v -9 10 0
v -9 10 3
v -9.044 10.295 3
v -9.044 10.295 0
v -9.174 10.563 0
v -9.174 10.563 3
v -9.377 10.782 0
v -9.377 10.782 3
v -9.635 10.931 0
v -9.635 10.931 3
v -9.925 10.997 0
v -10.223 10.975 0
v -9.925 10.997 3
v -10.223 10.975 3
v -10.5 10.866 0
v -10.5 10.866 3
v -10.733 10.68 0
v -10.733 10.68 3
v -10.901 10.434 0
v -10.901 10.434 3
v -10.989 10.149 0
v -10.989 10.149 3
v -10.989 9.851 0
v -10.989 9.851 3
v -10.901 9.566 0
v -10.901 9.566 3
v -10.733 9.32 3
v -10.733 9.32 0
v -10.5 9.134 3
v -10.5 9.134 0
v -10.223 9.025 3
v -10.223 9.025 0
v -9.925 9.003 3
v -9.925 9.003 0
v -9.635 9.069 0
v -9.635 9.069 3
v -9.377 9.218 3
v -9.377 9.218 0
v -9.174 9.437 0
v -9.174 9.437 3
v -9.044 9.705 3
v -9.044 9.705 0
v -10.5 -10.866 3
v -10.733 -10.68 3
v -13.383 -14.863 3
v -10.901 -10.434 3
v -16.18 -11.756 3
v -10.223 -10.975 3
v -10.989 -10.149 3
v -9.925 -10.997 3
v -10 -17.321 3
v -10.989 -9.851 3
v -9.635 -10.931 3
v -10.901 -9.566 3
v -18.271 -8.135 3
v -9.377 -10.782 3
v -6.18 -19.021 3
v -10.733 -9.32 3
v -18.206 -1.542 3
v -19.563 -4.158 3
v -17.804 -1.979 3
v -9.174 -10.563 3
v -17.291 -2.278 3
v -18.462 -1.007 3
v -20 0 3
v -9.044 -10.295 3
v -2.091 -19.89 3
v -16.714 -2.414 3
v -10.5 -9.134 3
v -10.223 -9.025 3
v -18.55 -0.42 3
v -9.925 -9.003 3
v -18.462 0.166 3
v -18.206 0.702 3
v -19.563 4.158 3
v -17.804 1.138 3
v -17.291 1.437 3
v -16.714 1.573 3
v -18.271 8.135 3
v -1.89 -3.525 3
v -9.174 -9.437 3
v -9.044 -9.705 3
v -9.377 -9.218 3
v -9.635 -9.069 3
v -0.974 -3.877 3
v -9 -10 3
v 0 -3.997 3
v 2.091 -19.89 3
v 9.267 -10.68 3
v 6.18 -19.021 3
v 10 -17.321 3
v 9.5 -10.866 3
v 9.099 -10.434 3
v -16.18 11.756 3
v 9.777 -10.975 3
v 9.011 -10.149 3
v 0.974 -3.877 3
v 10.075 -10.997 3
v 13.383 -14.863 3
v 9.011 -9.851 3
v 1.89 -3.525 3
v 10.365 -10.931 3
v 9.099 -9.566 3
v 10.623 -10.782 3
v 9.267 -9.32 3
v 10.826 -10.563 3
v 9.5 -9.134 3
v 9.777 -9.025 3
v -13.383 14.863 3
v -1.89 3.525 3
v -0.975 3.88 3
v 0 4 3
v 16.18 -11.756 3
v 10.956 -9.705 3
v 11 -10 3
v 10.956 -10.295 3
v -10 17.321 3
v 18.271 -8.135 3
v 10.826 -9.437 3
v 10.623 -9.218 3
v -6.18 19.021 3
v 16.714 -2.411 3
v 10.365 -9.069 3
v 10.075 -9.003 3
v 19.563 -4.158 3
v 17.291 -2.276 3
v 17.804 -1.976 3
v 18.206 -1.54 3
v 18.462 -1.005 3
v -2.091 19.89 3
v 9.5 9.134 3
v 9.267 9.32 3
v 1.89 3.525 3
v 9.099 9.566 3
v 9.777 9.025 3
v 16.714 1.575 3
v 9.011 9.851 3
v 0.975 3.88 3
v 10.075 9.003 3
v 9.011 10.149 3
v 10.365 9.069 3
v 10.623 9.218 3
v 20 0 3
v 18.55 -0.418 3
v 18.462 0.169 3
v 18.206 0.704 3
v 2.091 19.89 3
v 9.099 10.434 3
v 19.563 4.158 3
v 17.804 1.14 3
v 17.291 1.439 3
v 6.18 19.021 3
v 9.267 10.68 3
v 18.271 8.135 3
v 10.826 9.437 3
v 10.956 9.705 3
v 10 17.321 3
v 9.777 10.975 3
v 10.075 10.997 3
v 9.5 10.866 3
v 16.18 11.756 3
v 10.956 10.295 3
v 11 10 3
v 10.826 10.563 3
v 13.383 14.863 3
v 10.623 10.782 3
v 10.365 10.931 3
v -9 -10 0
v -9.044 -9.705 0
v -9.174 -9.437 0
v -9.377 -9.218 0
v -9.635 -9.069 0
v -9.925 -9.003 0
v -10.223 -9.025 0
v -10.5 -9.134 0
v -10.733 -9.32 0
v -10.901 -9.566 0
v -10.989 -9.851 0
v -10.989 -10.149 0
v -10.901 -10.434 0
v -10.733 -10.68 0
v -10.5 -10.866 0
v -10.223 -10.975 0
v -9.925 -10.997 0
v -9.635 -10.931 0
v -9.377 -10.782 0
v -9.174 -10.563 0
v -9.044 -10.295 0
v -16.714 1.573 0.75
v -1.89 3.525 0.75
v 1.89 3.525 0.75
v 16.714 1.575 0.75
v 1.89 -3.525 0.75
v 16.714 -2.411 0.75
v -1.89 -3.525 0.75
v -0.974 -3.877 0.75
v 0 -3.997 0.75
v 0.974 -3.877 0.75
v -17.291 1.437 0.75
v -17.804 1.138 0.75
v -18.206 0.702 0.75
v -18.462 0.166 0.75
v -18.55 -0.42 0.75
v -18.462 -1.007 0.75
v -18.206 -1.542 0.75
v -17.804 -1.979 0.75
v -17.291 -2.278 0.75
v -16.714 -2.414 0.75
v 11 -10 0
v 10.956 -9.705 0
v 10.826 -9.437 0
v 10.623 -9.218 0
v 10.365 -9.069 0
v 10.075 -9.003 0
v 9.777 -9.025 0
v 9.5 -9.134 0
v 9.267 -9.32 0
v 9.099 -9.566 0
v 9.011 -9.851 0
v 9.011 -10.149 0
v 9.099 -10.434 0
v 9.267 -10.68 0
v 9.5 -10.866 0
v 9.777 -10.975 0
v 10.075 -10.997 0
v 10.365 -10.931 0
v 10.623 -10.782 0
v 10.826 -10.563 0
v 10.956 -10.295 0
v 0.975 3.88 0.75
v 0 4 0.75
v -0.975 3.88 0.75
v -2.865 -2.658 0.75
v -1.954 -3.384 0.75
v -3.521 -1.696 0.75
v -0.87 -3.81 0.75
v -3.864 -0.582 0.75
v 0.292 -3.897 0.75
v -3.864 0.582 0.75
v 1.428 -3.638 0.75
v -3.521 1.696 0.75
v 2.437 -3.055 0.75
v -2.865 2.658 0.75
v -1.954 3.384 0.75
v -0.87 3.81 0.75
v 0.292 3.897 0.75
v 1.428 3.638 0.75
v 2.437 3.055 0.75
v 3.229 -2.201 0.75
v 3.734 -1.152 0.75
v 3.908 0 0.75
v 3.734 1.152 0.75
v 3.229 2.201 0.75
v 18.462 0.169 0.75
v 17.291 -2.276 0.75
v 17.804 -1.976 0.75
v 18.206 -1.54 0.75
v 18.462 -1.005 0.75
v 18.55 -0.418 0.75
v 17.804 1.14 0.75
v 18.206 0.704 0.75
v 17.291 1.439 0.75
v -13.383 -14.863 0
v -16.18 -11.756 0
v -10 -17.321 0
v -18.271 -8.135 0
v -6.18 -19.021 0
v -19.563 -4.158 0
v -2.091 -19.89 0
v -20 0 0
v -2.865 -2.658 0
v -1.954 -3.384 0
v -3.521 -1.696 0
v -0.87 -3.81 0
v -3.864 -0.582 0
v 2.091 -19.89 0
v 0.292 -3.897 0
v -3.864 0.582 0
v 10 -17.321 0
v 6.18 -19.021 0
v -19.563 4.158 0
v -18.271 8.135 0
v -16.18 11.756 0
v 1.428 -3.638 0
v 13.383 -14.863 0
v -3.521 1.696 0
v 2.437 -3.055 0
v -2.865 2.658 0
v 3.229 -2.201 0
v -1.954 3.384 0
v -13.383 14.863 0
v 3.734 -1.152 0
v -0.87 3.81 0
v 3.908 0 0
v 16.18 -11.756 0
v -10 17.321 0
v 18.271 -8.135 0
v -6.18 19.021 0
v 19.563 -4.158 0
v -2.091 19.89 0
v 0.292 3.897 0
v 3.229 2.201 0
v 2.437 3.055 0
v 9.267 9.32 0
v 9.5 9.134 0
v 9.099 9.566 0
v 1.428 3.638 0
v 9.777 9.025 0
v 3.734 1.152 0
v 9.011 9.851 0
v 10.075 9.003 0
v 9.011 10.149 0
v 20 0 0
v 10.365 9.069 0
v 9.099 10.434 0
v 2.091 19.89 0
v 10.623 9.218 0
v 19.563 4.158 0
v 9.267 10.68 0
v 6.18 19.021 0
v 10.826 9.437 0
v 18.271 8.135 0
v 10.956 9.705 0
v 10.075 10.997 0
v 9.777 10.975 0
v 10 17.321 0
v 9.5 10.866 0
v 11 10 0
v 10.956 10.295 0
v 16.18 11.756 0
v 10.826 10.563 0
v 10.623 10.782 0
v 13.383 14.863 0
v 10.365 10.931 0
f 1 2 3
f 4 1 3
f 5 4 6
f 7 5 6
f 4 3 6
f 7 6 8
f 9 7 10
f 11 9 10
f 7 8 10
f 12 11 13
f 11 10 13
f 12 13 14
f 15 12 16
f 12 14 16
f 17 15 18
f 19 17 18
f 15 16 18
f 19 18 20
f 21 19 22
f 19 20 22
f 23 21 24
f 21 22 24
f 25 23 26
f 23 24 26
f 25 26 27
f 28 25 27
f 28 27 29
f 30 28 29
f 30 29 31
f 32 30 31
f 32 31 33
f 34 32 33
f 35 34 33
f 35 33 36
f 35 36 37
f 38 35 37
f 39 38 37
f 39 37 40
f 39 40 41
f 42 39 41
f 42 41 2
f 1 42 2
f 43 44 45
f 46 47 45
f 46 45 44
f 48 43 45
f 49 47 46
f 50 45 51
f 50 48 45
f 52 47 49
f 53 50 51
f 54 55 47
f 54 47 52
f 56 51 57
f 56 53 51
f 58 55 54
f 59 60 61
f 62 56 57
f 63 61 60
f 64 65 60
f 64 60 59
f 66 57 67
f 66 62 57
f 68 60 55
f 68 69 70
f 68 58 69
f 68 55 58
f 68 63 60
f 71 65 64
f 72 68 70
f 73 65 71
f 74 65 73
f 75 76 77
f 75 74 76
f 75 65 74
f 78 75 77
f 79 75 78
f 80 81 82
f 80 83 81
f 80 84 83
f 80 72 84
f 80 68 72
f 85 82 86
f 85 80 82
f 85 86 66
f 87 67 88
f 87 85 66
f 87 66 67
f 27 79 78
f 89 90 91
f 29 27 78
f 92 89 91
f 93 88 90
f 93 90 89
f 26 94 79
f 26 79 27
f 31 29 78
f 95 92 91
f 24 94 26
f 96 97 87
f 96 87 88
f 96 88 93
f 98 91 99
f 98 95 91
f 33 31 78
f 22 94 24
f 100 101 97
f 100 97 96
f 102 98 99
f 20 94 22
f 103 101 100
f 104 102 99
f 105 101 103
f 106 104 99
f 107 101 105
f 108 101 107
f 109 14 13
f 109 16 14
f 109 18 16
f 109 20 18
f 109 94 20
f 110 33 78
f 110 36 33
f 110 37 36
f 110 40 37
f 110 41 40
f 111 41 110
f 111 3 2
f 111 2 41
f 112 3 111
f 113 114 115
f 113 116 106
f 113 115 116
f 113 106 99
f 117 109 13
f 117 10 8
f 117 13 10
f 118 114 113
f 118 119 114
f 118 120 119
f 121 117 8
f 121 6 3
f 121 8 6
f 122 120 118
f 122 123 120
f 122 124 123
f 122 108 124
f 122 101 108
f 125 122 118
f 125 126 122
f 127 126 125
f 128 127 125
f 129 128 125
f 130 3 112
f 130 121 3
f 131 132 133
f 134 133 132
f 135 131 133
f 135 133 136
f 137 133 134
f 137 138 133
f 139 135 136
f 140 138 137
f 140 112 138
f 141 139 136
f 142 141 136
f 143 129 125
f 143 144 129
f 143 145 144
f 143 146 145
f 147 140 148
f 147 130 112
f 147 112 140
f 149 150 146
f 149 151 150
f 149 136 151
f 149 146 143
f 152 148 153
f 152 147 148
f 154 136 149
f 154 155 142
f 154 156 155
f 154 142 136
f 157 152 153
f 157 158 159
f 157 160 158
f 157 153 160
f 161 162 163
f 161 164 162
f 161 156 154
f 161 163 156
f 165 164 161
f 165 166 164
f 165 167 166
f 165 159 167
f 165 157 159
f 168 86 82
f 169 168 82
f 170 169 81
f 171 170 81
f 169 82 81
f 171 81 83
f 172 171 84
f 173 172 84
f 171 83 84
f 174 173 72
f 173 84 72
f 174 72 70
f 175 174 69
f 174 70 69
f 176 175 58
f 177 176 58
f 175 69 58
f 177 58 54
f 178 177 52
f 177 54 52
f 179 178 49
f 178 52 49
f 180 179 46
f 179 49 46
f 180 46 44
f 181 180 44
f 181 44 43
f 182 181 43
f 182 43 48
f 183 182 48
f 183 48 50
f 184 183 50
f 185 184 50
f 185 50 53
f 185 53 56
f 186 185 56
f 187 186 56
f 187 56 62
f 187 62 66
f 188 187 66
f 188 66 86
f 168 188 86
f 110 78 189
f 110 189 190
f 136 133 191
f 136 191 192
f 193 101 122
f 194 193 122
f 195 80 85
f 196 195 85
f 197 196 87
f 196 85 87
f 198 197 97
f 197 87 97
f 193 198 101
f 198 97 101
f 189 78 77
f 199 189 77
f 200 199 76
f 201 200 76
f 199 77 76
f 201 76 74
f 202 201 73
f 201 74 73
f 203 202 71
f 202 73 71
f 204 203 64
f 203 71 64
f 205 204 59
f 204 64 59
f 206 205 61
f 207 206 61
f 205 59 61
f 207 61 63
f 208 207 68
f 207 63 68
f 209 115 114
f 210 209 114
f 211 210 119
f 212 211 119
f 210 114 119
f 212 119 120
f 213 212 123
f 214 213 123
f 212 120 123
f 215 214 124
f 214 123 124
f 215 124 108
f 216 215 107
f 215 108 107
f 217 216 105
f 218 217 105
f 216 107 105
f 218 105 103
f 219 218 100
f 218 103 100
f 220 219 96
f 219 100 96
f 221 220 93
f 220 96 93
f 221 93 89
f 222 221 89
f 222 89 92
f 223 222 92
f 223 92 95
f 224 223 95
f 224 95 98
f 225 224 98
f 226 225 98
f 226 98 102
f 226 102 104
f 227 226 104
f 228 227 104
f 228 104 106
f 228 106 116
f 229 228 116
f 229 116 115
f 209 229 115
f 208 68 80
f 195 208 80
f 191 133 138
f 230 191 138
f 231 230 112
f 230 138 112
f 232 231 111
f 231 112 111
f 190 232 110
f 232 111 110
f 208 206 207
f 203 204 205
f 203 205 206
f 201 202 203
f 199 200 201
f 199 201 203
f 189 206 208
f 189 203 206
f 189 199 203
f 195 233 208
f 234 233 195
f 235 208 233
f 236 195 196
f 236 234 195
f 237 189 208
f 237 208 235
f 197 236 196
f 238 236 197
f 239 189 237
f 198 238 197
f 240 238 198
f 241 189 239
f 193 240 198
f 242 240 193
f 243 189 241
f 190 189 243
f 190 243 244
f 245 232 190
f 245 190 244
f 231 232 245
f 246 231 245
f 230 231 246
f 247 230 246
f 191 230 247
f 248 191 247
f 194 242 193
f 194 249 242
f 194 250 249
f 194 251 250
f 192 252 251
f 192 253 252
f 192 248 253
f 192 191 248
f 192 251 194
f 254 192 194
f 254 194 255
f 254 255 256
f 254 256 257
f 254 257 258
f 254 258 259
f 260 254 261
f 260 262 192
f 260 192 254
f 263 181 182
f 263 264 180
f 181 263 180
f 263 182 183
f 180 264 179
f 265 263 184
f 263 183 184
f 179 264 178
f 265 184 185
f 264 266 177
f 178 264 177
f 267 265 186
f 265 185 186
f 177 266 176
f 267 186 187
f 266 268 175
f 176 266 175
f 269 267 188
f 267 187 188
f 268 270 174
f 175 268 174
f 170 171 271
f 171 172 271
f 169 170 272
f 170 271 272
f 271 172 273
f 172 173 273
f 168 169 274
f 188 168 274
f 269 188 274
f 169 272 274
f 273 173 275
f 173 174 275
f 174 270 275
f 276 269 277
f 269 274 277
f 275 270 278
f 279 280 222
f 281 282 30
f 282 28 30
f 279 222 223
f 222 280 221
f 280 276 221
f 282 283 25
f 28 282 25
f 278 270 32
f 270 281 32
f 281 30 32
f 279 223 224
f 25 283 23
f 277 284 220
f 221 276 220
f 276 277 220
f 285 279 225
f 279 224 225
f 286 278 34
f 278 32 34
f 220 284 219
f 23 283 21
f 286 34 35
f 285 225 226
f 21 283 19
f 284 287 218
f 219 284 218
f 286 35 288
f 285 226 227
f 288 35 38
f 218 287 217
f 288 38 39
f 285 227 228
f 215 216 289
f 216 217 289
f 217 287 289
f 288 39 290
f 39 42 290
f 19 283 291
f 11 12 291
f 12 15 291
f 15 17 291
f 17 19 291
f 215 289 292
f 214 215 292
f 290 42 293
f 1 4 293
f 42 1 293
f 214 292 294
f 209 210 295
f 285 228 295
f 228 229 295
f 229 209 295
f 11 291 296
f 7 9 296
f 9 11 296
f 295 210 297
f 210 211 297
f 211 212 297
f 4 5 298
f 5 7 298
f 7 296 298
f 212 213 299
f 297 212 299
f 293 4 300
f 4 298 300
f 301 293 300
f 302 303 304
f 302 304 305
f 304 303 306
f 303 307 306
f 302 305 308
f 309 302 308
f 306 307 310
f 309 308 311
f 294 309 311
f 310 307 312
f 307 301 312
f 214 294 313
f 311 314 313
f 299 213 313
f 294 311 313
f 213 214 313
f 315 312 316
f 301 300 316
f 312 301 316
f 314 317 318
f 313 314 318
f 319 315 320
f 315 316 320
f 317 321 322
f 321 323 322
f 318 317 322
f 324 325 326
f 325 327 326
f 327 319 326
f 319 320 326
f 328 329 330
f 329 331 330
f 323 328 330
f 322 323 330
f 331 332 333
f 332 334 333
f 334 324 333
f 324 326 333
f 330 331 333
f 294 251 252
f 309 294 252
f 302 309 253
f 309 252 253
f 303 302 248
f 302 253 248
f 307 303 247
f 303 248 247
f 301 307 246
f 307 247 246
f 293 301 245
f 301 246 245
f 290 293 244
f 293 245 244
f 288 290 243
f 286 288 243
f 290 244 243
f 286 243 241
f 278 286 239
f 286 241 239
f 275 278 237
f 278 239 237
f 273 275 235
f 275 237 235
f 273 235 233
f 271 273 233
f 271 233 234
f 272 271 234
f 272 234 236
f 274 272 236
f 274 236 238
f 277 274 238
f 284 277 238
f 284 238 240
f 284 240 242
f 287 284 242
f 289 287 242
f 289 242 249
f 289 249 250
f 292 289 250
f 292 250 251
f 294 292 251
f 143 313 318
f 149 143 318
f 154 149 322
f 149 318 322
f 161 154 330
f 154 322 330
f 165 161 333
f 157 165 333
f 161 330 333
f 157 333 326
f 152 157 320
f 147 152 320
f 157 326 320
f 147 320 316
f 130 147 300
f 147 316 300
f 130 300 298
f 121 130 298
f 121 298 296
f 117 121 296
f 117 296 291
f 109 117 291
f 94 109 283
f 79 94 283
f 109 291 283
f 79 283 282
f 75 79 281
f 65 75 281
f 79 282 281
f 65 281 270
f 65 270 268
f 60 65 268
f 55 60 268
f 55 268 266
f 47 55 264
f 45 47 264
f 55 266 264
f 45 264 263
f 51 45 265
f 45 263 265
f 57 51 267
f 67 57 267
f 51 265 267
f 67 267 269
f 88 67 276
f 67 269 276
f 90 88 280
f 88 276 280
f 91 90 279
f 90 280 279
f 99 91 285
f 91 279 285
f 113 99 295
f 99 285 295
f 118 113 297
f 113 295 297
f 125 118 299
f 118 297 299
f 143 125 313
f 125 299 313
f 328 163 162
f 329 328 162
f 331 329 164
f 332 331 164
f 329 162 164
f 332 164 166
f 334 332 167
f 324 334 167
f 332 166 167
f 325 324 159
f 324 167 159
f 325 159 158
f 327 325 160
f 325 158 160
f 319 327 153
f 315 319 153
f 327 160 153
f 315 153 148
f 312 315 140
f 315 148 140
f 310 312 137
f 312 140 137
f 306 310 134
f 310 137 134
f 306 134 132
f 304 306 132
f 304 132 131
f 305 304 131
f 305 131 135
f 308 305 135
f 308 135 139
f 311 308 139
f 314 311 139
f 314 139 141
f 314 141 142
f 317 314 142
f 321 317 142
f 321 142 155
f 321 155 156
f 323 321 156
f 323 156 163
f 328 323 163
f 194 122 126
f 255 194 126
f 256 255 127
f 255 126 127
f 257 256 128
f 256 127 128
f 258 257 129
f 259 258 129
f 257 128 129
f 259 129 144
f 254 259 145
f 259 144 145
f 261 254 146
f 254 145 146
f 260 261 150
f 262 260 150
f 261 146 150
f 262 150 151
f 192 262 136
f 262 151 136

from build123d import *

# Parameters (mm, degrees)
SKETCH_R        = 20
PAD_DEPTH       = 3
POCKET_DEPTH    = 2.25
SKETCH002_R     = 3.907938
POCKET001_DEPTH = 2
SKETCH004_R     = 1
POCKET004_DEPTH = 5


with BuildPart() as part:
    # Sketch → Pad (new body)
    with BuildSketch(Plane.XY):
        Circle(SKETCH_R)
    extrude(amount=PAD_DEPTH)

    # Sketch001 (on Face3 of Pad) → Pocket (cut)
    with BuildSketch(Plane.XY.offset(3)):
        with BuildLine():
            ThreePointArc((1.890302, 3.525161), (0, 4.000122), (-1.890302, 3.525161))
            Line((-16.713594, 1.572988), (-1.890302, 3.525161))
            ThreePointArc((-16.713594, 1.572988), (-18.55, -0.42031), (-16.713594, -2.413609))
            Line((-16.713594, -2.413609), (-1.890302, -3.525161))
            ThreePointArc((-1.890302, -3.525161), (0, -3.996936), (1.890302, -3.525161))
            Line((1.890302, -3.525161), (16.713789, -2.411491))
            ThreePointArc((16.713789, -2.411491), (18.55, -0.418209), (16.713789, 1.575073))
            Line((1.890302, 3.525161), (16.713789, 1.575073))
        make_face()
    extrude(amount=-POCKET_DEPTH, mode=Mode.SUBTRACT)

    # Sketch002 (on Face12 of Pocket) → Pocket001 (cut)
    with BuildSketch(Plane.XY.offset(0.75)):
        Circle(SKETCH002_R)
    extrude(amount=-POCKET001_DEPTH, mode=Mode.SUBTRACT)

    # Sketch004 (on Face3 of Pocket001) → Pocket004 (cut)
    with BuildSketch(Plane.XY.offset(3)):
        with Locations((-10, 10)):
            Circle(SKETCH004_R)
        with Locations((10, 10)):
            Circle(SKETCH004_R)
        with Locations((10, -10)):
            Circle(SKETCH004_R)
        with Locations((-10, -10)):
            Circle(SKETCH004_R)
    extrude(amount=-POCKET004_DEPTH, mode=Mode.SUBTRACT)


solid = part.part
